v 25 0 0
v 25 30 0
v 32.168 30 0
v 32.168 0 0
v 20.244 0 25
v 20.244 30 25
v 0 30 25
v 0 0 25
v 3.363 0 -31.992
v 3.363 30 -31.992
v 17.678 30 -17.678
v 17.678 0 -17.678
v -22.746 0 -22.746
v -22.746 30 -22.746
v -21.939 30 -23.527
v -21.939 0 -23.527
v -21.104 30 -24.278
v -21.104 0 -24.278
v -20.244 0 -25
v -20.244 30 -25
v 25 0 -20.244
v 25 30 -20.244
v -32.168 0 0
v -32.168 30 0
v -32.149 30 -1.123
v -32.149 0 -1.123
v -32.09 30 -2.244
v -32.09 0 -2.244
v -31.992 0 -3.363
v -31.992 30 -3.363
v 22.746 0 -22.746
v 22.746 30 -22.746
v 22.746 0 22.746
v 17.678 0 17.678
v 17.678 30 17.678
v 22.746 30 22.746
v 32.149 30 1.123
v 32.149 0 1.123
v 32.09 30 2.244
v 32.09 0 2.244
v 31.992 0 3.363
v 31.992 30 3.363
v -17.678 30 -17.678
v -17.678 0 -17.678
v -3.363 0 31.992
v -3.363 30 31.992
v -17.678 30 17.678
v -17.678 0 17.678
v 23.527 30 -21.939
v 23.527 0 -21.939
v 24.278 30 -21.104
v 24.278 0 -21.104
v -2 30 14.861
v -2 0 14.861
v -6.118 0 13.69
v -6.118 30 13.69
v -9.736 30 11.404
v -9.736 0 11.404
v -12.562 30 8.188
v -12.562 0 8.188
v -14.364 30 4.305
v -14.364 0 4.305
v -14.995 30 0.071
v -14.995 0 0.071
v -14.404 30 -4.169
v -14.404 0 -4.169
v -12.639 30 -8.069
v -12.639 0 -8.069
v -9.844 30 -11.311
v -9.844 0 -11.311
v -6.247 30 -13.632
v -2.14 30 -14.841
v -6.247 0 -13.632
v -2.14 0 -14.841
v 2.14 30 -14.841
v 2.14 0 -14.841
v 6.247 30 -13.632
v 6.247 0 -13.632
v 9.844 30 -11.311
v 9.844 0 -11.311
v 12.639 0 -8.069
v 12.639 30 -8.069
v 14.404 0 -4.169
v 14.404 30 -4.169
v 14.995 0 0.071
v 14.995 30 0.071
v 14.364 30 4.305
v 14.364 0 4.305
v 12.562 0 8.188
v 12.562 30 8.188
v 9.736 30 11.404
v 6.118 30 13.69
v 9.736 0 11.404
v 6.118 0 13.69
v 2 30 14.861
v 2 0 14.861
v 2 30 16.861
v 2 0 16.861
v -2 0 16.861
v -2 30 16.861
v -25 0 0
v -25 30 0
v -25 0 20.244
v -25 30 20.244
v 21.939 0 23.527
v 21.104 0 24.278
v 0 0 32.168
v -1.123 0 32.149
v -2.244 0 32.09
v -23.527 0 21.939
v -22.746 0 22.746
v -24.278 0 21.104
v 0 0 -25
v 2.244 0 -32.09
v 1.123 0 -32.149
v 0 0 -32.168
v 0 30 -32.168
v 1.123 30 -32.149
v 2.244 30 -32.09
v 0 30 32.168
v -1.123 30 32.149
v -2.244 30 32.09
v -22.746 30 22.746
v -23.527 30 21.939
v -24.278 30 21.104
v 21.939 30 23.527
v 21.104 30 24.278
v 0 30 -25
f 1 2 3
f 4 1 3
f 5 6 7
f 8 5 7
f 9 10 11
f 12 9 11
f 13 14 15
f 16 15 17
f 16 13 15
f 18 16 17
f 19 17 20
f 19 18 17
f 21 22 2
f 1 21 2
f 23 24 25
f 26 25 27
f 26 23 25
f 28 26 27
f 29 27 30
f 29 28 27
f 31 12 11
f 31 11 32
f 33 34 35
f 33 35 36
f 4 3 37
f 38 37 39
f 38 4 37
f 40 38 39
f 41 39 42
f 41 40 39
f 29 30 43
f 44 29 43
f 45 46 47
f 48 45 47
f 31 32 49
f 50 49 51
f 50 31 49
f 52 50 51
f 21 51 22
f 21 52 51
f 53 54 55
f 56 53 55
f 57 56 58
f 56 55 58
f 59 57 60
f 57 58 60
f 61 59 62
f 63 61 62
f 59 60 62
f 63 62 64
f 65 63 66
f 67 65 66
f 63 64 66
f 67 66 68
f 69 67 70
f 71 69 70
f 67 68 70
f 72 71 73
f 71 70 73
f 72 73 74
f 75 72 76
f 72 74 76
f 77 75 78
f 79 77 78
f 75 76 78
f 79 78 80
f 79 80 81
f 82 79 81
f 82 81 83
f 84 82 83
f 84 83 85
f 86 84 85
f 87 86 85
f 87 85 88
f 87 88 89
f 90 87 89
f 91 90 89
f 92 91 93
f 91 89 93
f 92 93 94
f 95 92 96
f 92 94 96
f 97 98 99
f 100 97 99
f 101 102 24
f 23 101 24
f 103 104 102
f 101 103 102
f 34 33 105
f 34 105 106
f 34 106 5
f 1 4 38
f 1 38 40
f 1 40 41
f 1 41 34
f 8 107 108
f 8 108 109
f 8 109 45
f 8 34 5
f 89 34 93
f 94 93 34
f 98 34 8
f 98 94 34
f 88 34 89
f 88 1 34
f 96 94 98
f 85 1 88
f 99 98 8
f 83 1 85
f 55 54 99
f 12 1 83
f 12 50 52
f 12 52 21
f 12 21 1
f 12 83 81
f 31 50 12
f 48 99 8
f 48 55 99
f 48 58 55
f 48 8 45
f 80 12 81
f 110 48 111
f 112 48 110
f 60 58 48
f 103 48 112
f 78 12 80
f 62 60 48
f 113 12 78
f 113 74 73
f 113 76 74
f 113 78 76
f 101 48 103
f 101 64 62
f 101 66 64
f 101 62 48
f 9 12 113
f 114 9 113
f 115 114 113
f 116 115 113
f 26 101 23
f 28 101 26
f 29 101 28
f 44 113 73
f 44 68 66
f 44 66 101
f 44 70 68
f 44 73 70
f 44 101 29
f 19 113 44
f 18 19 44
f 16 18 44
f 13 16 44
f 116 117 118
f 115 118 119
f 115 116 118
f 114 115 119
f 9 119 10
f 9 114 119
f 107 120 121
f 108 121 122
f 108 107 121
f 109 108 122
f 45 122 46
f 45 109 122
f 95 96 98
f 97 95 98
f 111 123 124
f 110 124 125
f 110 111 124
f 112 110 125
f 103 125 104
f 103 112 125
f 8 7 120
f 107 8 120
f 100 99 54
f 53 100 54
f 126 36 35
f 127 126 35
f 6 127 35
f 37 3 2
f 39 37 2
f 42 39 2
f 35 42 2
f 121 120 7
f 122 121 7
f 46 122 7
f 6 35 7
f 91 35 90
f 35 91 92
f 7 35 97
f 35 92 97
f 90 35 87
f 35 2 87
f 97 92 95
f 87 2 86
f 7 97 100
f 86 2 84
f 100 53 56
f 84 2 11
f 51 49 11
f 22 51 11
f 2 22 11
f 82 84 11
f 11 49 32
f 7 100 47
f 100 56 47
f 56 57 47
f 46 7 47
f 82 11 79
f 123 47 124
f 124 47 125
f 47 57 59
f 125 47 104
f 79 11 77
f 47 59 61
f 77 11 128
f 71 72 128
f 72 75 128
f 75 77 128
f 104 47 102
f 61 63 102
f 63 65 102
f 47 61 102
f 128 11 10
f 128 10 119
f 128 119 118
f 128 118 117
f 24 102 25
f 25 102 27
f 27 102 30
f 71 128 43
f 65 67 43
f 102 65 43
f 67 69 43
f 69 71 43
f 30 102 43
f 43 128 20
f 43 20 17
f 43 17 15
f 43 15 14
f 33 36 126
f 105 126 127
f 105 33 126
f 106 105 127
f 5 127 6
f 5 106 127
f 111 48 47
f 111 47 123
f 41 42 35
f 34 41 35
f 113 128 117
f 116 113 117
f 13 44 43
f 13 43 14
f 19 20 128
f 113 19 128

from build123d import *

# Parameters (mm, degrees)
BOSS_EXTRUDE3_DEPTH = 30


with BuildPart() as part:
    # Sketch1 → Boss-Extrude3 (new body)
    with BuildSketch(Plane(origin=(0, 0, 0), x_dir=(1, 0, 0), z_dir=(0, 1, 0))):
        with BuildLine():
            Line((0, -25), (0, -32.168320657))
            ThreePointArc((0, -32.168320657), (-1.683972021, -32.124213487), (-3.36332613, -31.992012929))
            Line((-3.36332613, -31.992012929), (-17.67766953, -17.67766953))
            Line((-17.67766953, -17.67766953), (-22.746437676, -22.746437676))
            ThreePointArc((-22.746437676, -22.746437676), (-23.905997232, -21.524501161), (-25, -20.243538572))
            Line((-25, -20.243538572), (-25, 0))
            Line((-25, 0), (-32.168320657, 0))
            ThreePointArc((-32.168320657, 0), (-32.124213487, 1.683972021), (-31.992012929, 3.36332613))
            Line((-31.992012929, 3.36332613), (-17.67766953, 17.67766953))
            Line((-17.67766953, 17.67766953), (-22.746437676, 22.746437676))
            ThreePointArc((-22.746437676, 22.746437676), (-21.524501161, 23.905997232), (-20.243538572, 25))
            Line((-20.243538572, 25), (0, 25))
            Line((0, 25), (0, 32.168320657))
            ThreePointArc((0, 32.168320657), (1.683972021, 32.124213487), (3.36332613, 31.992012929))
            Line((3.36332613, 31.992012929), (17.67766953, 17.67766953))
            Line((17.67766953, 17.67766953), (22.746437676, 22.746437676))
            ThreePointArc((22.746437676, 22.746437676), (23.905997232, 21.524501161), (25, 20.243538572))
            Line((25, 20.243538572), (25, 0))
            Line((25, 0), (32.168320657, 0))
            ThreePointArc((32.168320657, 0), (32.124213487, -1.683972021), (31.992012929, -3.36332613))
            Line((31.992012929, -3.36332613), (17.67766953, -17.67766953))
            Line((17.67766953, -17.67766953), (22.746437676, -22.746437676))
            ThreePointArc((22.746437676, -22.746437676), (21.524501161, -23.905997232), (20.243538572, -25))
            Line((20.243538572, -25), (0, -25))
        make_face()
        with BuildLine():
            Line((-2, -16.860742714), (-2, -14.860742714))
            ThreePointArc((-2, -14.860742714), (0, 14.994721539), (2, -14.860742714))
            Line((2, -14.860742714), (2, -16.860742714))
            Line((2, -16.860742714), (-2, -16.860742714))
        make_face(mode=Mode.SUBTRACT)
    extrude(amount=BOSS_EXTRUDE3_DEPTH)


solid = part.part
